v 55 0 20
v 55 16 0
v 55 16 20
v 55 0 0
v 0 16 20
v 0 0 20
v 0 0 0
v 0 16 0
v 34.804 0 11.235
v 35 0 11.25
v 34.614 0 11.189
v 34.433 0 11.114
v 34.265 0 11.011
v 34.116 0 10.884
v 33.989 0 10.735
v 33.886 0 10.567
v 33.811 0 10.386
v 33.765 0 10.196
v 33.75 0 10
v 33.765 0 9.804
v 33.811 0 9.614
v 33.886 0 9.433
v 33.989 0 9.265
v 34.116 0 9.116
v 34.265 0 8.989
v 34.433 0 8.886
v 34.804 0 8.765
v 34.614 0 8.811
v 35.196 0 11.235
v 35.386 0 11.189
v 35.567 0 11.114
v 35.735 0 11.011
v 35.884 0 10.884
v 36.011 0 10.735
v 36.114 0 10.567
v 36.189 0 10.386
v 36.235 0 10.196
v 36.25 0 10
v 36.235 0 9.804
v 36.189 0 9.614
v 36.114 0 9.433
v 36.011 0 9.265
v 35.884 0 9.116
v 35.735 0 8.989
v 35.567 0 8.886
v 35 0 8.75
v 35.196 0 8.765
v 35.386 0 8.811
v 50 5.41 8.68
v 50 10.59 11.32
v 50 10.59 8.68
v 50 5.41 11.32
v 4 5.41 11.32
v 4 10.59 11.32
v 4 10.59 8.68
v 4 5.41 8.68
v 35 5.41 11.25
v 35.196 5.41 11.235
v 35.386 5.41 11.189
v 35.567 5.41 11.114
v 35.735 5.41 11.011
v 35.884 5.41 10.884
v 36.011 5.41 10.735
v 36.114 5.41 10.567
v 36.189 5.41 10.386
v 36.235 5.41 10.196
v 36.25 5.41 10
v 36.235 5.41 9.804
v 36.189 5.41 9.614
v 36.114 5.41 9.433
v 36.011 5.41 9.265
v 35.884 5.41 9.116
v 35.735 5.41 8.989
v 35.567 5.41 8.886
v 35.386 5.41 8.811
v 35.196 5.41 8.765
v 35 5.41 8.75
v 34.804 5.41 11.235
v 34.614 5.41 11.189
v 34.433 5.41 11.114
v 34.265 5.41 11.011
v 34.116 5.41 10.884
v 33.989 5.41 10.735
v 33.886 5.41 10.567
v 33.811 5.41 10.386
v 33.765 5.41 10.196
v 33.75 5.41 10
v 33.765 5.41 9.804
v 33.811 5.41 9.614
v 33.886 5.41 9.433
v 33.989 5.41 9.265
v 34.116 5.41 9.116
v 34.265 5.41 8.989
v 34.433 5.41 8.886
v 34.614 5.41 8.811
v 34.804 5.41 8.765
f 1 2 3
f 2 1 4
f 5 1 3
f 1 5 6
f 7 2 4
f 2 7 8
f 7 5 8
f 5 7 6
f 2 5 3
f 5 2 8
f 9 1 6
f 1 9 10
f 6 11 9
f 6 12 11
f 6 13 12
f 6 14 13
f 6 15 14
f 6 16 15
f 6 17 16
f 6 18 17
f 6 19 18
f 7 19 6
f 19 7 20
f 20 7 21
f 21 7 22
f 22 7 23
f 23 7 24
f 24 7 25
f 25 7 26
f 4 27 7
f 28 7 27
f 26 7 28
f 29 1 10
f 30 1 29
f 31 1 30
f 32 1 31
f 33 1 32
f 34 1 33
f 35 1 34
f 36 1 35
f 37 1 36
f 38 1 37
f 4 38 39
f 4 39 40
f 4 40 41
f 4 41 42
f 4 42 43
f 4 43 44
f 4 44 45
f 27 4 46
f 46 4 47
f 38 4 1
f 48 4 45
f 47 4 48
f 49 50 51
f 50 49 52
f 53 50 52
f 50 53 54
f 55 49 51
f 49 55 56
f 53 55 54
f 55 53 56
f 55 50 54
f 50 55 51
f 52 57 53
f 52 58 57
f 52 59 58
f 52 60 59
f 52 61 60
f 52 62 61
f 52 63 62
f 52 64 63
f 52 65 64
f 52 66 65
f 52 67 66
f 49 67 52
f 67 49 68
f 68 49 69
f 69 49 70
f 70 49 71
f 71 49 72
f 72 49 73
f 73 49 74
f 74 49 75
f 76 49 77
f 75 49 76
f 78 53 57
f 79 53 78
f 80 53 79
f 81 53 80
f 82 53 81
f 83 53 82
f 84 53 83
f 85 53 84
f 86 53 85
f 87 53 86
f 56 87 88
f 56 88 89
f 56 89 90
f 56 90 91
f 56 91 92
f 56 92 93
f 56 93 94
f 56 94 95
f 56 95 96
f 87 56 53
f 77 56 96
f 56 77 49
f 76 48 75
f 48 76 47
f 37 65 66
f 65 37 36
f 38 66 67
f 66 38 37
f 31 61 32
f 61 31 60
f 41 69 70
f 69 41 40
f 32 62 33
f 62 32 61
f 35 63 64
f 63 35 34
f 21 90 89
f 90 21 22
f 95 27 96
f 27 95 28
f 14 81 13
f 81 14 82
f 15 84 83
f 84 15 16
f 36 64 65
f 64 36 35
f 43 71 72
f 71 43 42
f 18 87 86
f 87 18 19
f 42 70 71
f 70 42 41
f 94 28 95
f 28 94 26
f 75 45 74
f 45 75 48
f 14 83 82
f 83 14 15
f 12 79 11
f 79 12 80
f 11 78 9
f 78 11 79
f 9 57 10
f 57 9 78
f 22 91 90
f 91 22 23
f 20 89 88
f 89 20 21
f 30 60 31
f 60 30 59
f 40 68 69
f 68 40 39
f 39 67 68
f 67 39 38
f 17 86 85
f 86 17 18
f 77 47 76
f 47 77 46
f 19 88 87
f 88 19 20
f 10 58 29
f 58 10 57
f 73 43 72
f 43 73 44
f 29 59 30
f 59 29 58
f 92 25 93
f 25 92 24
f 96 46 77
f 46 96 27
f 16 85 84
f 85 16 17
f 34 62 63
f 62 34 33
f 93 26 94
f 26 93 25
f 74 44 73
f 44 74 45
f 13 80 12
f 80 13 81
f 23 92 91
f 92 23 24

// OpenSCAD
// TAYLKOMB corrected shared receiver core visual
slot_w = 5.18;
slot_h = 2.64;
slot_d = 46.0;
body_l = 55;
body_w = 16;
body_h = 20;
difference() {
    cube([body_l, body_w, body_h], center=false);
    translate([4, body_w/2 - slot_w/2, body_h/2 - slot_h/2]) cube([slot_d, slot_w, slot_h], center=false);
    translate([35, body_w/2, body_h/2]) rotate([90,0,0]) cylinder(h=8, r=1.25, $fn=40);
}
